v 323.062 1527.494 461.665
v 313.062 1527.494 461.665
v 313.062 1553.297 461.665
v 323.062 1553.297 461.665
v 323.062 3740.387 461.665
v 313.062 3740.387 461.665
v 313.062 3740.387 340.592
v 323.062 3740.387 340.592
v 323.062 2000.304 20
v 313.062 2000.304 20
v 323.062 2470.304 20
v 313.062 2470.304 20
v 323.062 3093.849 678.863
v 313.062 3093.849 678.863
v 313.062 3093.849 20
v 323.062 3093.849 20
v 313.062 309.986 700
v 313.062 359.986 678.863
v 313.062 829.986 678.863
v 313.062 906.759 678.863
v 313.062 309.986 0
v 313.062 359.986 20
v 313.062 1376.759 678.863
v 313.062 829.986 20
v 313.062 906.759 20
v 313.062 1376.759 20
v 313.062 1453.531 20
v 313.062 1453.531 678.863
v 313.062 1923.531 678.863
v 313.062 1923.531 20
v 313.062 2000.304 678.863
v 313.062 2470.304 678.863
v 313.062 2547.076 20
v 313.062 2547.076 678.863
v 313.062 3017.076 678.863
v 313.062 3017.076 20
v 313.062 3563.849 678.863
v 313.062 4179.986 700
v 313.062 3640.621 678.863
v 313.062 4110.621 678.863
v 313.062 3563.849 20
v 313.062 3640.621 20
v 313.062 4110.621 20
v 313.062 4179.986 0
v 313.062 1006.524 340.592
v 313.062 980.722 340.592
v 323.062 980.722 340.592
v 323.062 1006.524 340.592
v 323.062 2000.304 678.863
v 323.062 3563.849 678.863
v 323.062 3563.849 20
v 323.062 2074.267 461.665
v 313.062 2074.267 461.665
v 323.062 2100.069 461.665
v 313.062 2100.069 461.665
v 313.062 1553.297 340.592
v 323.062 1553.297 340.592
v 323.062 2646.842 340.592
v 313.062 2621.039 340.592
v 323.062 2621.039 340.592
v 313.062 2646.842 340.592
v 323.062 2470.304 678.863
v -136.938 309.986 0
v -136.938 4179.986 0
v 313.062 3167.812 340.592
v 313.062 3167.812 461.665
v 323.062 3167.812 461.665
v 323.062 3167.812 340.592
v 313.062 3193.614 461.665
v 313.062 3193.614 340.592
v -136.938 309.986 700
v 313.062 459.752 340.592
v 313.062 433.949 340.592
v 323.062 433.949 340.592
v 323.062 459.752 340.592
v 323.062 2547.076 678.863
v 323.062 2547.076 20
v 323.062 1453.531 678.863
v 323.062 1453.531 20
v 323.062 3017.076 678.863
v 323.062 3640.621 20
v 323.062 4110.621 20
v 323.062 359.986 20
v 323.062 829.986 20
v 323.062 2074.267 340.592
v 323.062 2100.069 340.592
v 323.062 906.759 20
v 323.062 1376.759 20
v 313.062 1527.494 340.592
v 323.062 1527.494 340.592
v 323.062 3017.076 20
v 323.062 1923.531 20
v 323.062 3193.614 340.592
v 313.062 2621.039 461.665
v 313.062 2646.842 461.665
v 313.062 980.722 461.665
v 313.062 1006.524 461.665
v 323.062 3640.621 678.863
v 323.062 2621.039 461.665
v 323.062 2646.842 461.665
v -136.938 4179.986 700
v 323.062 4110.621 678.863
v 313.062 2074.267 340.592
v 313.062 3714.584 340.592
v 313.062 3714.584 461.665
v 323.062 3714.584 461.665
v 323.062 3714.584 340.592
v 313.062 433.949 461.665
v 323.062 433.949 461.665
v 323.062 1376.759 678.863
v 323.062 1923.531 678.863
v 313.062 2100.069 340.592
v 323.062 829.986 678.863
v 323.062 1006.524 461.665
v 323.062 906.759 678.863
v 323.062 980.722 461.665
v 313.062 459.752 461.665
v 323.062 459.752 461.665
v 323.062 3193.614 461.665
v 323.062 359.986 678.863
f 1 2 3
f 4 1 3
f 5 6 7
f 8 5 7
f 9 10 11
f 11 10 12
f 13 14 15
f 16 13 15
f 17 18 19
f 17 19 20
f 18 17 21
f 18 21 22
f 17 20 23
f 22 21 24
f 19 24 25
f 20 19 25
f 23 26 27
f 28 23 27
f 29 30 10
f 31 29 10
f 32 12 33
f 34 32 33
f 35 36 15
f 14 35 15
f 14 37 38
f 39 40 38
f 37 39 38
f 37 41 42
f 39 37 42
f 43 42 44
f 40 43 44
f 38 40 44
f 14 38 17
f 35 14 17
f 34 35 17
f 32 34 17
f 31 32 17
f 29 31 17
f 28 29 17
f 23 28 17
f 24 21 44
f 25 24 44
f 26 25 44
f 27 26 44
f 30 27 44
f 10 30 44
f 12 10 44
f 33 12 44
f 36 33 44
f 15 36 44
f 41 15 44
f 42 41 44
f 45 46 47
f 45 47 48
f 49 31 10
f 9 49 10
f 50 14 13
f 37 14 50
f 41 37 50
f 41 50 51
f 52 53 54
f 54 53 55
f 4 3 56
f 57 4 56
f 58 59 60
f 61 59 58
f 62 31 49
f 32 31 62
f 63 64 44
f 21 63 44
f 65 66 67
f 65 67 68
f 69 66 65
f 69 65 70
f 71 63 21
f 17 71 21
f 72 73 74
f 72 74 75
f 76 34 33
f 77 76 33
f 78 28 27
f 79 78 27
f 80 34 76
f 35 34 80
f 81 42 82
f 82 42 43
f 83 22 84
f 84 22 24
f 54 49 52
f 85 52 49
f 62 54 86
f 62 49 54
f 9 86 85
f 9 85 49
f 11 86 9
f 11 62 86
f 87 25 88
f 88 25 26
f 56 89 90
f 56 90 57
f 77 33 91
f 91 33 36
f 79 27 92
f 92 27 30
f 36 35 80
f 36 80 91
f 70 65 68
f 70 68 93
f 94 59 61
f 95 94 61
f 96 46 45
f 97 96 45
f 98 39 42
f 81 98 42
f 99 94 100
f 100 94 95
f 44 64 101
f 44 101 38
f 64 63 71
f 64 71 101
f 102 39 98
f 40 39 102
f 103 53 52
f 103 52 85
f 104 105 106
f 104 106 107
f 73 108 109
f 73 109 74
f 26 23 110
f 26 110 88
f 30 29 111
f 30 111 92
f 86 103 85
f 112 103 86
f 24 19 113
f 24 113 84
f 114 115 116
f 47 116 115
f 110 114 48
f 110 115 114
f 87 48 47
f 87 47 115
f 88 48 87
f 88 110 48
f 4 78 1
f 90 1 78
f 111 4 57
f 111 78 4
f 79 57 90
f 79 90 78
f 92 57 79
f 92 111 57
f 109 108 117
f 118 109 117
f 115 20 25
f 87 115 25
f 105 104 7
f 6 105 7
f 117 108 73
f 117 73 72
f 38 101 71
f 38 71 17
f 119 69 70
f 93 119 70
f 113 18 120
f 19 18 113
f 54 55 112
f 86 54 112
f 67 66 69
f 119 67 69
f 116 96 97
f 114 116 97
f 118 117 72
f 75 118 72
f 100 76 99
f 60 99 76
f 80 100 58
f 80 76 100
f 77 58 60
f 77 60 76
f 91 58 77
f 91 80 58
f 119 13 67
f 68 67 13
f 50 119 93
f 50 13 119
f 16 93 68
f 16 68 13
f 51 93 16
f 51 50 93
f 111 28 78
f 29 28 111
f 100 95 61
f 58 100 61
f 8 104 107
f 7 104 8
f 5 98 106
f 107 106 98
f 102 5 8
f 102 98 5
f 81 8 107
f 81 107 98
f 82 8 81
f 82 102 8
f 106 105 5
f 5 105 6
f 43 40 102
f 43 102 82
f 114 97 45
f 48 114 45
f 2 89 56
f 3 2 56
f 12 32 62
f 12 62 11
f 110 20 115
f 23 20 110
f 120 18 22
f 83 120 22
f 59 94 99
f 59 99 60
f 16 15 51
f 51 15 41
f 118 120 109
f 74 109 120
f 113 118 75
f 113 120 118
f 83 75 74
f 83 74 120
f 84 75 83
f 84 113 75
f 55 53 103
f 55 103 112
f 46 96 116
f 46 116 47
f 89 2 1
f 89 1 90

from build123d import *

# Parameters (mm, degrees)
SKETCH1_W           = 450
SKETCH1_H           = 3870
BOSS_EXTRUDE1_DEPTH = 700
SKETCH3_W           = 658.862952103
SKETCH3_H           = 470
SKETCH3_W_2         = 121.072841775
SKETCH3_H_2         = 25.802408902
SKETCH3_H_3         = 25.802408903
BOSS_EXTRUDE3_DEPTH = 10


with BuildPart() as part:
    # Sketch1 → Boss-Extrude1 (new body)
    with BuildSketch(Plane.XY):
        with Locations((88.061970043, 2244.986327315)):
            Rectangle(SKETCH1_W, SKETCH1_H)
    extrude(amount=BOSS_EXTRUDE1_DEPTH)

    # Sketch3 → Boss-Extrude3 (add)
    with BuildSketch(Plane(origin=(313.061970043, 0, 0), x_dir=(0, 0, -1), z_dir=(1, 0, 0))):
        with Locations((-349.431476051, 594.986327315)):
            Rectangle(SKETCH3_W, SKETCH3_H)
        with Locations((-401.128332344, 446.85045415)):
            Rectangle(SKETCH3_W_2, SKETCH3_H_2, mode=Mode.SUBTRACT)
        with Locations((-349.431476051, 1141.758813467)):
            Rectangle(SKETCH3_W, SKETCH3_H)
        with Locations((-401.128332344, 993.622940303)):
            Rectangle(SKETCH3_W_2, SKETCH3_H_3, mode=Mode.SUBTRACT)
        with Locations((-349.431476051, 1688.531299619)):
            Rectangle(SKETCH3_W, SKETCH3_H)
        with Locations((-401.128332344, 1540.395426455)):
            Rectangle(SKETCH3_W_2, SKETCH3_H_3, mode=Mode.SUBTRACT)
        with Locations((-349.431476051, 2235.303785772)):
            Rectangle(SKETCH3_W, SKETCH3_H)
        with Locations((-401.128332344, 2087.167912607)):
            Rectangle(SKETCH3_W_2, SKETCH3_H_3, mode=Mode.SUBTRACT)
        with Locations((-349.431476051, 2782.076271924)):
            Rectangle(SKETCH3_W, SKETCH3_H)
        with Locations((-401.128332344, 2633.940398759)):
            Rectangle(SKETCH3_W_2, SKETCH3_H_3, mode=Mode.SUBTRACT)
        with Locations((-349.431476051, 3328.848758076)):
            Rectangle(SKETCH3_W, SKETCH3_H)
        with Locations((-401.128332344, 3180.712884911)):
            Rectangle(SKETCH3_W_2, SKETCH3_H_2, mode=Mode.SUBTRACT)
        with Locations((-349.431476051, 3875.621244228)):
            Rectangle(SKETCH3_W, SKETCH3_H)
        with Locations((-401.128332344, 3727.485371064)):
            Rectangle(SKETCH3_W_2, SKETCH3_H_3, mode=Mode.SUBTRACT)
    extrude(amount=BOSS_EXTRUDE3_DEPTH)


solid = part.part
